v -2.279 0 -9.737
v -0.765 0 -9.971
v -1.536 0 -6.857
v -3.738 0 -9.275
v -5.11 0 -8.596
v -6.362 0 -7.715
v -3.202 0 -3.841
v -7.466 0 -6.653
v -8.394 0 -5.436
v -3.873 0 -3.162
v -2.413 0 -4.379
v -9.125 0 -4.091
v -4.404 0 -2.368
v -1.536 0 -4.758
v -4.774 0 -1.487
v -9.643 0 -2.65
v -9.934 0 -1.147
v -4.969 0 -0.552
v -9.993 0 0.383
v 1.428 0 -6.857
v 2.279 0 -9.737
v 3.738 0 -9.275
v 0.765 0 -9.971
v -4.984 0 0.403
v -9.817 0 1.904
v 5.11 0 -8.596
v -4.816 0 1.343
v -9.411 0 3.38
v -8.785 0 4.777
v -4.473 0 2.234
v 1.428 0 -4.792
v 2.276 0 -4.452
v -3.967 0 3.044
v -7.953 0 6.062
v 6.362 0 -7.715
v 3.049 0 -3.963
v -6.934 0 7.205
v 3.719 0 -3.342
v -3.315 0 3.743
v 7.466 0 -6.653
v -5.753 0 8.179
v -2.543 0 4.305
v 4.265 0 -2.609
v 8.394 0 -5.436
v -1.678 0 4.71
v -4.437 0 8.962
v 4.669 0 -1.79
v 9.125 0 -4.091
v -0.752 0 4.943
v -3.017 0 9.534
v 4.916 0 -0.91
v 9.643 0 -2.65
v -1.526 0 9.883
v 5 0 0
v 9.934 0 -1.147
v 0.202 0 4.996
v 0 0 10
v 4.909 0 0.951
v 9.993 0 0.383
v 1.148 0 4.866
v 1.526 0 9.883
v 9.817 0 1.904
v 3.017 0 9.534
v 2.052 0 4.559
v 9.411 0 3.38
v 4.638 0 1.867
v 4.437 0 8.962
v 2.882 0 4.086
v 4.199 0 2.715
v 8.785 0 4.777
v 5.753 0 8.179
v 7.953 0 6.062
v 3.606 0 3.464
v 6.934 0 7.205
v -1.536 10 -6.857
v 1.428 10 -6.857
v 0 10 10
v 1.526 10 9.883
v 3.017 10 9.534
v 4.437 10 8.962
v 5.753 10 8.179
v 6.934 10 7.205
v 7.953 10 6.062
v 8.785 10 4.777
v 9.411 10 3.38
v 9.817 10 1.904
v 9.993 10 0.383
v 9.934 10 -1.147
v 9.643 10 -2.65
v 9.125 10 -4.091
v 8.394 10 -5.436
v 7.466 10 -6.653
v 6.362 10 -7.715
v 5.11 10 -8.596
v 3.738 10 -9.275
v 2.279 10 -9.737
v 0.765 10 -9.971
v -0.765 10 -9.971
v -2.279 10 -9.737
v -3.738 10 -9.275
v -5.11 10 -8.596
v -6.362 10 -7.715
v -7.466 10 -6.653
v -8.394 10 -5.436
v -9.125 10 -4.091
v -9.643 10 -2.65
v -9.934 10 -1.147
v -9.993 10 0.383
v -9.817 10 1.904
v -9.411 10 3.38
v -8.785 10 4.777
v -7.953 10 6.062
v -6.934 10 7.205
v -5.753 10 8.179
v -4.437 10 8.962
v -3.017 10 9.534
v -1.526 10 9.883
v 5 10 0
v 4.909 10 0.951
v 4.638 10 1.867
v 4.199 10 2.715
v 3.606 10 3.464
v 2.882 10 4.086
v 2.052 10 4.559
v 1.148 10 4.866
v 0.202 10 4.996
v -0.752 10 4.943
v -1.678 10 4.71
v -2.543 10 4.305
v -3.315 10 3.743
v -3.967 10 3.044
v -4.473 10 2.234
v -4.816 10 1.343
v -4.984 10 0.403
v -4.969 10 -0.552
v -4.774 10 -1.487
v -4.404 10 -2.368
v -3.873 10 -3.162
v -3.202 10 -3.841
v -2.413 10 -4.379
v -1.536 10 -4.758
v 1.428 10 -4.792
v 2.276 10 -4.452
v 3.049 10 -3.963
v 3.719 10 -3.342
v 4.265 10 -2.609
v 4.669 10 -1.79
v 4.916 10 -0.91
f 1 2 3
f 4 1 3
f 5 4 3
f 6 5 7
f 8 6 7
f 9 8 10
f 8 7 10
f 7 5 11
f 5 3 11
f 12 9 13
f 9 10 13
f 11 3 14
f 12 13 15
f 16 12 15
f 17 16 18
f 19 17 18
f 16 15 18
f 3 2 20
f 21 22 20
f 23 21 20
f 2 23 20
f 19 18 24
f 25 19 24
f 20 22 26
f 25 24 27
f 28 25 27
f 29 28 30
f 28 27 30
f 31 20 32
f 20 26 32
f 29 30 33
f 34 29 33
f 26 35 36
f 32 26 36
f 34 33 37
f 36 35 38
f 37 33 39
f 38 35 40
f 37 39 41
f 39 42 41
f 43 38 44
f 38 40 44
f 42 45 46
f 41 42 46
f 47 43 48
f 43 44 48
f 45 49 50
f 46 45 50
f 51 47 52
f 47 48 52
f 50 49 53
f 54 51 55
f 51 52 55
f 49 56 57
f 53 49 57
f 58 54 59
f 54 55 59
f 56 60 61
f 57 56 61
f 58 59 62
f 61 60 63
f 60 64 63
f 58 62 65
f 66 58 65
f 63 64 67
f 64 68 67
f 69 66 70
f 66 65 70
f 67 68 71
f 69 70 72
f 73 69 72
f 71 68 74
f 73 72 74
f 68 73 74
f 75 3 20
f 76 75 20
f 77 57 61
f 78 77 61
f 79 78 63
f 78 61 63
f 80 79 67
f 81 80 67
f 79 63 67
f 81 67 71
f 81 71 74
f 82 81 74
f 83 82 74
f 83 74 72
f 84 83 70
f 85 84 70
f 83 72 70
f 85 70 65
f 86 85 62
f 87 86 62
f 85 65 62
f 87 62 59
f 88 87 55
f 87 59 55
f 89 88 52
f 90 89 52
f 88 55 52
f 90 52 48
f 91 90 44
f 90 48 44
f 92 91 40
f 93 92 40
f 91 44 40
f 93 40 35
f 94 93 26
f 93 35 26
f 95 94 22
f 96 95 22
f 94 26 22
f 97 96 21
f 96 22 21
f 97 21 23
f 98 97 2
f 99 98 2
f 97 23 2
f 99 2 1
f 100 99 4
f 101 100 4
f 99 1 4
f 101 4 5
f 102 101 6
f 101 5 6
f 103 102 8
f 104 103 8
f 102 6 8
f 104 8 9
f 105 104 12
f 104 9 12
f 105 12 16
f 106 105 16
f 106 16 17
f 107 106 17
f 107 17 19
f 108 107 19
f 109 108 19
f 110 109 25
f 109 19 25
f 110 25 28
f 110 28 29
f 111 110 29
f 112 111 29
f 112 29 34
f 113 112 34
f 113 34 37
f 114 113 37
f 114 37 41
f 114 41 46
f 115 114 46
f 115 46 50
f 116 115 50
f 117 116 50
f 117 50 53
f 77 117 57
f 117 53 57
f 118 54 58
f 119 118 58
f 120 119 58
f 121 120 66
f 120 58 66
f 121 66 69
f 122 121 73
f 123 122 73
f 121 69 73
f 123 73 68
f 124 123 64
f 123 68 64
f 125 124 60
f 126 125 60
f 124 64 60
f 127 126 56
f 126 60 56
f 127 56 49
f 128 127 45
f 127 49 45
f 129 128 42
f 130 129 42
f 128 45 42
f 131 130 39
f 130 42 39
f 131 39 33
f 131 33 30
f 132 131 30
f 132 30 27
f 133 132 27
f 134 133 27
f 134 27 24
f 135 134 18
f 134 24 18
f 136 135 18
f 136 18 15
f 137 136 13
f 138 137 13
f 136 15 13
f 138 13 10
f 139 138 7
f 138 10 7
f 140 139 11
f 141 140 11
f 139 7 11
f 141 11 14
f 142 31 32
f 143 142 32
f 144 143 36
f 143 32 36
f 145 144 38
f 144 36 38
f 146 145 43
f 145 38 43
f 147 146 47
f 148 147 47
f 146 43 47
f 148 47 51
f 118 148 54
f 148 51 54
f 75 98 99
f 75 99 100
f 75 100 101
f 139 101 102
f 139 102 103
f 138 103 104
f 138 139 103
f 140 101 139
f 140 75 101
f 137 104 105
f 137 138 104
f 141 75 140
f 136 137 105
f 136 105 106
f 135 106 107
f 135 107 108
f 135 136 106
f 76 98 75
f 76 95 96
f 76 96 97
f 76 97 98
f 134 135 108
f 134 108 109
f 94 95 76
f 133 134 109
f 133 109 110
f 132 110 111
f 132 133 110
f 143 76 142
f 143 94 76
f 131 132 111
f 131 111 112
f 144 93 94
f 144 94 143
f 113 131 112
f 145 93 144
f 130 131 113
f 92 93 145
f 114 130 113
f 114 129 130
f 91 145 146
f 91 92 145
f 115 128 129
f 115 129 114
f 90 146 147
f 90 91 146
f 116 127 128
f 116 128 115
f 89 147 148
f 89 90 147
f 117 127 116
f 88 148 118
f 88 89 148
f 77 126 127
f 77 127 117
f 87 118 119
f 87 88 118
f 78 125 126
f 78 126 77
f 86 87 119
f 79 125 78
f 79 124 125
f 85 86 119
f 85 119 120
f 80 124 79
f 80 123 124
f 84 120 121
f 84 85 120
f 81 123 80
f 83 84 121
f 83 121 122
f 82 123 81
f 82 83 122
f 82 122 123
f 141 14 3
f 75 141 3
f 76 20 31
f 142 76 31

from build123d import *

# Parameters (mm, degrees)
SKETCH_1_R      = 10
EXTRUDE_1_DEPTH = 10


with BuildPart() as part:
    # 스케치1 → 보스-돌출1 (new body)
    with BuildSketch(Plane(origin=(0, 0, 0), x_dir=(1, 0, 0), z_dir=(0, 1, 0))):
        with Locations(Location((0, 0, 0), (0, 0, 270))):
            Circle(SKETCH_1_R)
        with BuildLine():
            ThreePointArc((5, 0), (-2.942731468, -4.042317591), (-1.536132603, 4.758182071))
            Line((-1.536132603, 4.758182071), (-1.536132603, 6.856766437))
            Line((-1.536132603, 6.856766437), (1.428204445, 6.856766437))
            Line((1.428204445, 6.856766437), (1.428204445, 4.791683636))
            ThreePointArc((1.428204445, 4.791683636), (4.0088042, 2.98822504), (5, 0))
        make_face(mode=Mode.SUBTRACT)
    extrude(amount=EXTRUDE_1_DEPTH)


solid = part.part
